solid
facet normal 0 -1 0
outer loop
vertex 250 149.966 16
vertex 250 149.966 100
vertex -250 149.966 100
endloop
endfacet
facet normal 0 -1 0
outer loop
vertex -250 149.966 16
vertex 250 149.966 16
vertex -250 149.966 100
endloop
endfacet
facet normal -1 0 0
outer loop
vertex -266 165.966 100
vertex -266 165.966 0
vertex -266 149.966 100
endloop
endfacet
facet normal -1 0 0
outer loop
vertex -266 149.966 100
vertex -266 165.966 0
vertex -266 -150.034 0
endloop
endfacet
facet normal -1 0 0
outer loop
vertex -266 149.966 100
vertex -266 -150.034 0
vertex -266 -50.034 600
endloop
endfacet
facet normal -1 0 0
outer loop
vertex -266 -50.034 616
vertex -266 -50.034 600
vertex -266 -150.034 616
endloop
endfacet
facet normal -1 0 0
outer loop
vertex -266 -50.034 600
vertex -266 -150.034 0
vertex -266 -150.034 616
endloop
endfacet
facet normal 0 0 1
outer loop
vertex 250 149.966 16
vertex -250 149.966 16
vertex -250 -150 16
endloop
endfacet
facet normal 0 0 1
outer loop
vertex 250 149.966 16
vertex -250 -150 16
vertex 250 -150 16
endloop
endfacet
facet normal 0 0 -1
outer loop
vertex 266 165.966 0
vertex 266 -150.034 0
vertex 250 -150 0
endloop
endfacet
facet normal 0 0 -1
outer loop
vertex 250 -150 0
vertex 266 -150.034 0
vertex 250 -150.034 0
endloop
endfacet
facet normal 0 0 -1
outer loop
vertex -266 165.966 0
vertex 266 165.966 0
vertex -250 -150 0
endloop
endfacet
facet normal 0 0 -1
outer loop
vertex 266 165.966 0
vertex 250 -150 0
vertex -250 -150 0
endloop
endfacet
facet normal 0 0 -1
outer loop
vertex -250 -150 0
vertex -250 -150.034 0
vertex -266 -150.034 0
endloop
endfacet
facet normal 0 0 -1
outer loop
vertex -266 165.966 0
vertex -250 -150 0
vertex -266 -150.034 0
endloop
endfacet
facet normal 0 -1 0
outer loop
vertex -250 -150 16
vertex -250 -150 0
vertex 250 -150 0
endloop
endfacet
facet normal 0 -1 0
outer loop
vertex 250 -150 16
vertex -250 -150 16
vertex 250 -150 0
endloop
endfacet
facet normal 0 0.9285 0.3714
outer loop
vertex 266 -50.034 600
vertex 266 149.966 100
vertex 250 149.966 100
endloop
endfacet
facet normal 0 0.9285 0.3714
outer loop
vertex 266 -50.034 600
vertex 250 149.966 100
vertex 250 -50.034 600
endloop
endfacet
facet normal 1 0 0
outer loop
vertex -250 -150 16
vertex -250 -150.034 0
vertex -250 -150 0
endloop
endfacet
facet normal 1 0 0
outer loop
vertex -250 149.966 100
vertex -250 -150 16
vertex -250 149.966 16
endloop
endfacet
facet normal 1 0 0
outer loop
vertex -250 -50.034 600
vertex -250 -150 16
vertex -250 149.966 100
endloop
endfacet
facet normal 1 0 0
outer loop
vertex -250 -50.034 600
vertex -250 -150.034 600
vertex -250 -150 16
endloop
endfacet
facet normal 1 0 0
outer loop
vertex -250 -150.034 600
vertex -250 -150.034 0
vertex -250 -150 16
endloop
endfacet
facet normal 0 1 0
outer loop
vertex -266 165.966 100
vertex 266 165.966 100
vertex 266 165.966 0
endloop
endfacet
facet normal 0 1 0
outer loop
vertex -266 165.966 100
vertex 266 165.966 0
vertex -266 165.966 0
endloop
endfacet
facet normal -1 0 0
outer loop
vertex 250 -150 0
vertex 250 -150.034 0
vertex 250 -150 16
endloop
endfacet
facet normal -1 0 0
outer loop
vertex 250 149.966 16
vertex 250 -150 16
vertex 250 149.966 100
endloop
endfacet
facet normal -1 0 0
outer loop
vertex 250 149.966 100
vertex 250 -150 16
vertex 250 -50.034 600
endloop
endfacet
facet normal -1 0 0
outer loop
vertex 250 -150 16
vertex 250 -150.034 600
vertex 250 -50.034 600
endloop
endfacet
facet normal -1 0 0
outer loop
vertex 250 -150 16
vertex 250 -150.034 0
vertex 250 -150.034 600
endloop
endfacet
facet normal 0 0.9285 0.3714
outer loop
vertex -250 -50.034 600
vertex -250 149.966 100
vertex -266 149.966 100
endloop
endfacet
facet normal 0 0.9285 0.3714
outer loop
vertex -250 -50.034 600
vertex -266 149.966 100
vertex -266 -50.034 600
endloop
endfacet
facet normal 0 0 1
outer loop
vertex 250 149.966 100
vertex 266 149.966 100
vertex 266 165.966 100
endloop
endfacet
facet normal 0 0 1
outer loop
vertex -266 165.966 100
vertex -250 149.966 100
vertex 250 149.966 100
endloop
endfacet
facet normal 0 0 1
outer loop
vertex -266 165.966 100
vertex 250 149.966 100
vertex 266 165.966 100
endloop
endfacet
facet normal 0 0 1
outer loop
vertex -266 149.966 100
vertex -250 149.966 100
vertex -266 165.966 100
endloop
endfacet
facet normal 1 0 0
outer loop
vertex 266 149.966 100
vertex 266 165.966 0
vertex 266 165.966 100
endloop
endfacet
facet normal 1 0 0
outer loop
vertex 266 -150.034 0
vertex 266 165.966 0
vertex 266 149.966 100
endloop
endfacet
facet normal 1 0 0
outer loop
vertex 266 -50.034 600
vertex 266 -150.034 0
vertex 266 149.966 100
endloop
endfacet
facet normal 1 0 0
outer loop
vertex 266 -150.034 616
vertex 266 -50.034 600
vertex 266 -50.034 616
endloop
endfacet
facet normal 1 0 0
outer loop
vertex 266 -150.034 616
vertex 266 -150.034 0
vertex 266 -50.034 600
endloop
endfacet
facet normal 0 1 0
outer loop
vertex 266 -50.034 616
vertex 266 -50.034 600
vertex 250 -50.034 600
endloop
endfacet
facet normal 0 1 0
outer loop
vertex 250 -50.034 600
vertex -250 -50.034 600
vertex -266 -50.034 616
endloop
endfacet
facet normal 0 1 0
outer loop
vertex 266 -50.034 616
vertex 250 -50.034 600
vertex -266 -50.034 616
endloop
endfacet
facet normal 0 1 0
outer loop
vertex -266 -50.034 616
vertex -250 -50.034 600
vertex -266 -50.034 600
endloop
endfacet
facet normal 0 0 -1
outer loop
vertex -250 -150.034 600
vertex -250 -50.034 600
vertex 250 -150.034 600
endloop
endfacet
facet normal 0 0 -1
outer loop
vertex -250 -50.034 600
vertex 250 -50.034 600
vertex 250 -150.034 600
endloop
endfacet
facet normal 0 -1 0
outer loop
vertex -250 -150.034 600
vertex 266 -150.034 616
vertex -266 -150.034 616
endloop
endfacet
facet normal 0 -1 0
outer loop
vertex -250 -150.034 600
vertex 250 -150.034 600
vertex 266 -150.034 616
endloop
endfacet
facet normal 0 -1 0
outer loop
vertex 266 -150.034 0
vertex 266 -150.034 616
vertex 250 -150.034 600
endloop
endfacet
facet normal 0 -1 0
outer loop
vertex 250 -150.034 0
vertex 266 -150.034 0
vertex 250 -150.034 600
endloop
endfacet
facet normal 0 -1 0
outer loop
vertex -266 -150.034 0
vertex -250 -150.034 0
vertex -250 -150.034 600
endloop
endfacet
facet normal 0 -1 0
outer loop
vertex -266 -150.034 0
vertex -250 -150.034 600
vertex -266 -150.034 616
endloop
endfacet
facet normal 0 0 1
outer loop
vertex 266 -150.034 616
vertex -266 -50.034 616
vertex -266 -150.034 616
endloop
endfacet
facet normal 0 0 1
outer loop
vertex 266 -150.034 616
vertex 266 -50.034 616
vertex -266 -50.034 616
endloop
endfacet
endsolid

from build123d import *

# Parameters (mm, degrees)
F0_W     = 500
F0_H     = 300
F1_DEPTH = 16
F2_W     = 300
F2_H     = 100
F3_DEPTH = 266
F4_DEPTH = 16
F5_DEPTH = 250
F6_DEPTH = 16
F7_W     = 532
F7_H     = 100
F8_DEPTH = 16


with BuildPart() as f1:
    # F0 (on Top) → F1 (new body)
    with BuildSketch(Plane.XY):
        Rectangle(F0_W, F0_H)
    extrude(amount=F1_DEPTH)

    # F2 (on Right) → F3 (join, symmetric)
    with BuildSketch(Plane.YZ):
        Polygon((-150.0342194658, 600), (-150.0342194658, 100), (149.9657805342, 100), (-50.0342194658, 600), align=None)
        with Locations((-0.0342194658, 50)):
            Rectangle(F2_W, F2_H)
    extrude(amount=F3_DEPTH, both=True)

    # F4 (add): a face of the model
    f4_faces = [f1.faces().sort_by_distance(p)[0] for p in [
        (0, -100.0342194658, 600),
    ]]
    extrude(f4_faces, amount=F4_DEPTH)

    # F2 (on Right) → F5 (cut, symmetric)
    with BuildSketch(Plane.YZ):
        with Locations((-0.0342194658, 50)):
            Rectangle(F2_W, F2_H)
        Polygon((-150.0342194658, 600), (-150.0342194658, 100), (149.9657805342, 100), (-50.0342194658, 600), align=None)
    extrude(amount=F5_DEPTH, both=True, mode=Mode.SUBTRACT)

    # F0 (on Top) → F6 (join)
    with BuildSketch(Plane.XY):
        Rectangle(F0_W, F0_H)
    extrude(amount=F6_DEPTH)

    # F7 (on face) → F8 (join)
    with BuildSketch(Plane(origin=(0, 149.9657805342, 0), x_dir=(-1, 0, 0), z_dir=(0, 1, 0))):
        with Locations((0, 50)):
            Rectangle(F7_W, F7_H)
    extrude(amount=F8_DEPTH)


solid = f1.part
